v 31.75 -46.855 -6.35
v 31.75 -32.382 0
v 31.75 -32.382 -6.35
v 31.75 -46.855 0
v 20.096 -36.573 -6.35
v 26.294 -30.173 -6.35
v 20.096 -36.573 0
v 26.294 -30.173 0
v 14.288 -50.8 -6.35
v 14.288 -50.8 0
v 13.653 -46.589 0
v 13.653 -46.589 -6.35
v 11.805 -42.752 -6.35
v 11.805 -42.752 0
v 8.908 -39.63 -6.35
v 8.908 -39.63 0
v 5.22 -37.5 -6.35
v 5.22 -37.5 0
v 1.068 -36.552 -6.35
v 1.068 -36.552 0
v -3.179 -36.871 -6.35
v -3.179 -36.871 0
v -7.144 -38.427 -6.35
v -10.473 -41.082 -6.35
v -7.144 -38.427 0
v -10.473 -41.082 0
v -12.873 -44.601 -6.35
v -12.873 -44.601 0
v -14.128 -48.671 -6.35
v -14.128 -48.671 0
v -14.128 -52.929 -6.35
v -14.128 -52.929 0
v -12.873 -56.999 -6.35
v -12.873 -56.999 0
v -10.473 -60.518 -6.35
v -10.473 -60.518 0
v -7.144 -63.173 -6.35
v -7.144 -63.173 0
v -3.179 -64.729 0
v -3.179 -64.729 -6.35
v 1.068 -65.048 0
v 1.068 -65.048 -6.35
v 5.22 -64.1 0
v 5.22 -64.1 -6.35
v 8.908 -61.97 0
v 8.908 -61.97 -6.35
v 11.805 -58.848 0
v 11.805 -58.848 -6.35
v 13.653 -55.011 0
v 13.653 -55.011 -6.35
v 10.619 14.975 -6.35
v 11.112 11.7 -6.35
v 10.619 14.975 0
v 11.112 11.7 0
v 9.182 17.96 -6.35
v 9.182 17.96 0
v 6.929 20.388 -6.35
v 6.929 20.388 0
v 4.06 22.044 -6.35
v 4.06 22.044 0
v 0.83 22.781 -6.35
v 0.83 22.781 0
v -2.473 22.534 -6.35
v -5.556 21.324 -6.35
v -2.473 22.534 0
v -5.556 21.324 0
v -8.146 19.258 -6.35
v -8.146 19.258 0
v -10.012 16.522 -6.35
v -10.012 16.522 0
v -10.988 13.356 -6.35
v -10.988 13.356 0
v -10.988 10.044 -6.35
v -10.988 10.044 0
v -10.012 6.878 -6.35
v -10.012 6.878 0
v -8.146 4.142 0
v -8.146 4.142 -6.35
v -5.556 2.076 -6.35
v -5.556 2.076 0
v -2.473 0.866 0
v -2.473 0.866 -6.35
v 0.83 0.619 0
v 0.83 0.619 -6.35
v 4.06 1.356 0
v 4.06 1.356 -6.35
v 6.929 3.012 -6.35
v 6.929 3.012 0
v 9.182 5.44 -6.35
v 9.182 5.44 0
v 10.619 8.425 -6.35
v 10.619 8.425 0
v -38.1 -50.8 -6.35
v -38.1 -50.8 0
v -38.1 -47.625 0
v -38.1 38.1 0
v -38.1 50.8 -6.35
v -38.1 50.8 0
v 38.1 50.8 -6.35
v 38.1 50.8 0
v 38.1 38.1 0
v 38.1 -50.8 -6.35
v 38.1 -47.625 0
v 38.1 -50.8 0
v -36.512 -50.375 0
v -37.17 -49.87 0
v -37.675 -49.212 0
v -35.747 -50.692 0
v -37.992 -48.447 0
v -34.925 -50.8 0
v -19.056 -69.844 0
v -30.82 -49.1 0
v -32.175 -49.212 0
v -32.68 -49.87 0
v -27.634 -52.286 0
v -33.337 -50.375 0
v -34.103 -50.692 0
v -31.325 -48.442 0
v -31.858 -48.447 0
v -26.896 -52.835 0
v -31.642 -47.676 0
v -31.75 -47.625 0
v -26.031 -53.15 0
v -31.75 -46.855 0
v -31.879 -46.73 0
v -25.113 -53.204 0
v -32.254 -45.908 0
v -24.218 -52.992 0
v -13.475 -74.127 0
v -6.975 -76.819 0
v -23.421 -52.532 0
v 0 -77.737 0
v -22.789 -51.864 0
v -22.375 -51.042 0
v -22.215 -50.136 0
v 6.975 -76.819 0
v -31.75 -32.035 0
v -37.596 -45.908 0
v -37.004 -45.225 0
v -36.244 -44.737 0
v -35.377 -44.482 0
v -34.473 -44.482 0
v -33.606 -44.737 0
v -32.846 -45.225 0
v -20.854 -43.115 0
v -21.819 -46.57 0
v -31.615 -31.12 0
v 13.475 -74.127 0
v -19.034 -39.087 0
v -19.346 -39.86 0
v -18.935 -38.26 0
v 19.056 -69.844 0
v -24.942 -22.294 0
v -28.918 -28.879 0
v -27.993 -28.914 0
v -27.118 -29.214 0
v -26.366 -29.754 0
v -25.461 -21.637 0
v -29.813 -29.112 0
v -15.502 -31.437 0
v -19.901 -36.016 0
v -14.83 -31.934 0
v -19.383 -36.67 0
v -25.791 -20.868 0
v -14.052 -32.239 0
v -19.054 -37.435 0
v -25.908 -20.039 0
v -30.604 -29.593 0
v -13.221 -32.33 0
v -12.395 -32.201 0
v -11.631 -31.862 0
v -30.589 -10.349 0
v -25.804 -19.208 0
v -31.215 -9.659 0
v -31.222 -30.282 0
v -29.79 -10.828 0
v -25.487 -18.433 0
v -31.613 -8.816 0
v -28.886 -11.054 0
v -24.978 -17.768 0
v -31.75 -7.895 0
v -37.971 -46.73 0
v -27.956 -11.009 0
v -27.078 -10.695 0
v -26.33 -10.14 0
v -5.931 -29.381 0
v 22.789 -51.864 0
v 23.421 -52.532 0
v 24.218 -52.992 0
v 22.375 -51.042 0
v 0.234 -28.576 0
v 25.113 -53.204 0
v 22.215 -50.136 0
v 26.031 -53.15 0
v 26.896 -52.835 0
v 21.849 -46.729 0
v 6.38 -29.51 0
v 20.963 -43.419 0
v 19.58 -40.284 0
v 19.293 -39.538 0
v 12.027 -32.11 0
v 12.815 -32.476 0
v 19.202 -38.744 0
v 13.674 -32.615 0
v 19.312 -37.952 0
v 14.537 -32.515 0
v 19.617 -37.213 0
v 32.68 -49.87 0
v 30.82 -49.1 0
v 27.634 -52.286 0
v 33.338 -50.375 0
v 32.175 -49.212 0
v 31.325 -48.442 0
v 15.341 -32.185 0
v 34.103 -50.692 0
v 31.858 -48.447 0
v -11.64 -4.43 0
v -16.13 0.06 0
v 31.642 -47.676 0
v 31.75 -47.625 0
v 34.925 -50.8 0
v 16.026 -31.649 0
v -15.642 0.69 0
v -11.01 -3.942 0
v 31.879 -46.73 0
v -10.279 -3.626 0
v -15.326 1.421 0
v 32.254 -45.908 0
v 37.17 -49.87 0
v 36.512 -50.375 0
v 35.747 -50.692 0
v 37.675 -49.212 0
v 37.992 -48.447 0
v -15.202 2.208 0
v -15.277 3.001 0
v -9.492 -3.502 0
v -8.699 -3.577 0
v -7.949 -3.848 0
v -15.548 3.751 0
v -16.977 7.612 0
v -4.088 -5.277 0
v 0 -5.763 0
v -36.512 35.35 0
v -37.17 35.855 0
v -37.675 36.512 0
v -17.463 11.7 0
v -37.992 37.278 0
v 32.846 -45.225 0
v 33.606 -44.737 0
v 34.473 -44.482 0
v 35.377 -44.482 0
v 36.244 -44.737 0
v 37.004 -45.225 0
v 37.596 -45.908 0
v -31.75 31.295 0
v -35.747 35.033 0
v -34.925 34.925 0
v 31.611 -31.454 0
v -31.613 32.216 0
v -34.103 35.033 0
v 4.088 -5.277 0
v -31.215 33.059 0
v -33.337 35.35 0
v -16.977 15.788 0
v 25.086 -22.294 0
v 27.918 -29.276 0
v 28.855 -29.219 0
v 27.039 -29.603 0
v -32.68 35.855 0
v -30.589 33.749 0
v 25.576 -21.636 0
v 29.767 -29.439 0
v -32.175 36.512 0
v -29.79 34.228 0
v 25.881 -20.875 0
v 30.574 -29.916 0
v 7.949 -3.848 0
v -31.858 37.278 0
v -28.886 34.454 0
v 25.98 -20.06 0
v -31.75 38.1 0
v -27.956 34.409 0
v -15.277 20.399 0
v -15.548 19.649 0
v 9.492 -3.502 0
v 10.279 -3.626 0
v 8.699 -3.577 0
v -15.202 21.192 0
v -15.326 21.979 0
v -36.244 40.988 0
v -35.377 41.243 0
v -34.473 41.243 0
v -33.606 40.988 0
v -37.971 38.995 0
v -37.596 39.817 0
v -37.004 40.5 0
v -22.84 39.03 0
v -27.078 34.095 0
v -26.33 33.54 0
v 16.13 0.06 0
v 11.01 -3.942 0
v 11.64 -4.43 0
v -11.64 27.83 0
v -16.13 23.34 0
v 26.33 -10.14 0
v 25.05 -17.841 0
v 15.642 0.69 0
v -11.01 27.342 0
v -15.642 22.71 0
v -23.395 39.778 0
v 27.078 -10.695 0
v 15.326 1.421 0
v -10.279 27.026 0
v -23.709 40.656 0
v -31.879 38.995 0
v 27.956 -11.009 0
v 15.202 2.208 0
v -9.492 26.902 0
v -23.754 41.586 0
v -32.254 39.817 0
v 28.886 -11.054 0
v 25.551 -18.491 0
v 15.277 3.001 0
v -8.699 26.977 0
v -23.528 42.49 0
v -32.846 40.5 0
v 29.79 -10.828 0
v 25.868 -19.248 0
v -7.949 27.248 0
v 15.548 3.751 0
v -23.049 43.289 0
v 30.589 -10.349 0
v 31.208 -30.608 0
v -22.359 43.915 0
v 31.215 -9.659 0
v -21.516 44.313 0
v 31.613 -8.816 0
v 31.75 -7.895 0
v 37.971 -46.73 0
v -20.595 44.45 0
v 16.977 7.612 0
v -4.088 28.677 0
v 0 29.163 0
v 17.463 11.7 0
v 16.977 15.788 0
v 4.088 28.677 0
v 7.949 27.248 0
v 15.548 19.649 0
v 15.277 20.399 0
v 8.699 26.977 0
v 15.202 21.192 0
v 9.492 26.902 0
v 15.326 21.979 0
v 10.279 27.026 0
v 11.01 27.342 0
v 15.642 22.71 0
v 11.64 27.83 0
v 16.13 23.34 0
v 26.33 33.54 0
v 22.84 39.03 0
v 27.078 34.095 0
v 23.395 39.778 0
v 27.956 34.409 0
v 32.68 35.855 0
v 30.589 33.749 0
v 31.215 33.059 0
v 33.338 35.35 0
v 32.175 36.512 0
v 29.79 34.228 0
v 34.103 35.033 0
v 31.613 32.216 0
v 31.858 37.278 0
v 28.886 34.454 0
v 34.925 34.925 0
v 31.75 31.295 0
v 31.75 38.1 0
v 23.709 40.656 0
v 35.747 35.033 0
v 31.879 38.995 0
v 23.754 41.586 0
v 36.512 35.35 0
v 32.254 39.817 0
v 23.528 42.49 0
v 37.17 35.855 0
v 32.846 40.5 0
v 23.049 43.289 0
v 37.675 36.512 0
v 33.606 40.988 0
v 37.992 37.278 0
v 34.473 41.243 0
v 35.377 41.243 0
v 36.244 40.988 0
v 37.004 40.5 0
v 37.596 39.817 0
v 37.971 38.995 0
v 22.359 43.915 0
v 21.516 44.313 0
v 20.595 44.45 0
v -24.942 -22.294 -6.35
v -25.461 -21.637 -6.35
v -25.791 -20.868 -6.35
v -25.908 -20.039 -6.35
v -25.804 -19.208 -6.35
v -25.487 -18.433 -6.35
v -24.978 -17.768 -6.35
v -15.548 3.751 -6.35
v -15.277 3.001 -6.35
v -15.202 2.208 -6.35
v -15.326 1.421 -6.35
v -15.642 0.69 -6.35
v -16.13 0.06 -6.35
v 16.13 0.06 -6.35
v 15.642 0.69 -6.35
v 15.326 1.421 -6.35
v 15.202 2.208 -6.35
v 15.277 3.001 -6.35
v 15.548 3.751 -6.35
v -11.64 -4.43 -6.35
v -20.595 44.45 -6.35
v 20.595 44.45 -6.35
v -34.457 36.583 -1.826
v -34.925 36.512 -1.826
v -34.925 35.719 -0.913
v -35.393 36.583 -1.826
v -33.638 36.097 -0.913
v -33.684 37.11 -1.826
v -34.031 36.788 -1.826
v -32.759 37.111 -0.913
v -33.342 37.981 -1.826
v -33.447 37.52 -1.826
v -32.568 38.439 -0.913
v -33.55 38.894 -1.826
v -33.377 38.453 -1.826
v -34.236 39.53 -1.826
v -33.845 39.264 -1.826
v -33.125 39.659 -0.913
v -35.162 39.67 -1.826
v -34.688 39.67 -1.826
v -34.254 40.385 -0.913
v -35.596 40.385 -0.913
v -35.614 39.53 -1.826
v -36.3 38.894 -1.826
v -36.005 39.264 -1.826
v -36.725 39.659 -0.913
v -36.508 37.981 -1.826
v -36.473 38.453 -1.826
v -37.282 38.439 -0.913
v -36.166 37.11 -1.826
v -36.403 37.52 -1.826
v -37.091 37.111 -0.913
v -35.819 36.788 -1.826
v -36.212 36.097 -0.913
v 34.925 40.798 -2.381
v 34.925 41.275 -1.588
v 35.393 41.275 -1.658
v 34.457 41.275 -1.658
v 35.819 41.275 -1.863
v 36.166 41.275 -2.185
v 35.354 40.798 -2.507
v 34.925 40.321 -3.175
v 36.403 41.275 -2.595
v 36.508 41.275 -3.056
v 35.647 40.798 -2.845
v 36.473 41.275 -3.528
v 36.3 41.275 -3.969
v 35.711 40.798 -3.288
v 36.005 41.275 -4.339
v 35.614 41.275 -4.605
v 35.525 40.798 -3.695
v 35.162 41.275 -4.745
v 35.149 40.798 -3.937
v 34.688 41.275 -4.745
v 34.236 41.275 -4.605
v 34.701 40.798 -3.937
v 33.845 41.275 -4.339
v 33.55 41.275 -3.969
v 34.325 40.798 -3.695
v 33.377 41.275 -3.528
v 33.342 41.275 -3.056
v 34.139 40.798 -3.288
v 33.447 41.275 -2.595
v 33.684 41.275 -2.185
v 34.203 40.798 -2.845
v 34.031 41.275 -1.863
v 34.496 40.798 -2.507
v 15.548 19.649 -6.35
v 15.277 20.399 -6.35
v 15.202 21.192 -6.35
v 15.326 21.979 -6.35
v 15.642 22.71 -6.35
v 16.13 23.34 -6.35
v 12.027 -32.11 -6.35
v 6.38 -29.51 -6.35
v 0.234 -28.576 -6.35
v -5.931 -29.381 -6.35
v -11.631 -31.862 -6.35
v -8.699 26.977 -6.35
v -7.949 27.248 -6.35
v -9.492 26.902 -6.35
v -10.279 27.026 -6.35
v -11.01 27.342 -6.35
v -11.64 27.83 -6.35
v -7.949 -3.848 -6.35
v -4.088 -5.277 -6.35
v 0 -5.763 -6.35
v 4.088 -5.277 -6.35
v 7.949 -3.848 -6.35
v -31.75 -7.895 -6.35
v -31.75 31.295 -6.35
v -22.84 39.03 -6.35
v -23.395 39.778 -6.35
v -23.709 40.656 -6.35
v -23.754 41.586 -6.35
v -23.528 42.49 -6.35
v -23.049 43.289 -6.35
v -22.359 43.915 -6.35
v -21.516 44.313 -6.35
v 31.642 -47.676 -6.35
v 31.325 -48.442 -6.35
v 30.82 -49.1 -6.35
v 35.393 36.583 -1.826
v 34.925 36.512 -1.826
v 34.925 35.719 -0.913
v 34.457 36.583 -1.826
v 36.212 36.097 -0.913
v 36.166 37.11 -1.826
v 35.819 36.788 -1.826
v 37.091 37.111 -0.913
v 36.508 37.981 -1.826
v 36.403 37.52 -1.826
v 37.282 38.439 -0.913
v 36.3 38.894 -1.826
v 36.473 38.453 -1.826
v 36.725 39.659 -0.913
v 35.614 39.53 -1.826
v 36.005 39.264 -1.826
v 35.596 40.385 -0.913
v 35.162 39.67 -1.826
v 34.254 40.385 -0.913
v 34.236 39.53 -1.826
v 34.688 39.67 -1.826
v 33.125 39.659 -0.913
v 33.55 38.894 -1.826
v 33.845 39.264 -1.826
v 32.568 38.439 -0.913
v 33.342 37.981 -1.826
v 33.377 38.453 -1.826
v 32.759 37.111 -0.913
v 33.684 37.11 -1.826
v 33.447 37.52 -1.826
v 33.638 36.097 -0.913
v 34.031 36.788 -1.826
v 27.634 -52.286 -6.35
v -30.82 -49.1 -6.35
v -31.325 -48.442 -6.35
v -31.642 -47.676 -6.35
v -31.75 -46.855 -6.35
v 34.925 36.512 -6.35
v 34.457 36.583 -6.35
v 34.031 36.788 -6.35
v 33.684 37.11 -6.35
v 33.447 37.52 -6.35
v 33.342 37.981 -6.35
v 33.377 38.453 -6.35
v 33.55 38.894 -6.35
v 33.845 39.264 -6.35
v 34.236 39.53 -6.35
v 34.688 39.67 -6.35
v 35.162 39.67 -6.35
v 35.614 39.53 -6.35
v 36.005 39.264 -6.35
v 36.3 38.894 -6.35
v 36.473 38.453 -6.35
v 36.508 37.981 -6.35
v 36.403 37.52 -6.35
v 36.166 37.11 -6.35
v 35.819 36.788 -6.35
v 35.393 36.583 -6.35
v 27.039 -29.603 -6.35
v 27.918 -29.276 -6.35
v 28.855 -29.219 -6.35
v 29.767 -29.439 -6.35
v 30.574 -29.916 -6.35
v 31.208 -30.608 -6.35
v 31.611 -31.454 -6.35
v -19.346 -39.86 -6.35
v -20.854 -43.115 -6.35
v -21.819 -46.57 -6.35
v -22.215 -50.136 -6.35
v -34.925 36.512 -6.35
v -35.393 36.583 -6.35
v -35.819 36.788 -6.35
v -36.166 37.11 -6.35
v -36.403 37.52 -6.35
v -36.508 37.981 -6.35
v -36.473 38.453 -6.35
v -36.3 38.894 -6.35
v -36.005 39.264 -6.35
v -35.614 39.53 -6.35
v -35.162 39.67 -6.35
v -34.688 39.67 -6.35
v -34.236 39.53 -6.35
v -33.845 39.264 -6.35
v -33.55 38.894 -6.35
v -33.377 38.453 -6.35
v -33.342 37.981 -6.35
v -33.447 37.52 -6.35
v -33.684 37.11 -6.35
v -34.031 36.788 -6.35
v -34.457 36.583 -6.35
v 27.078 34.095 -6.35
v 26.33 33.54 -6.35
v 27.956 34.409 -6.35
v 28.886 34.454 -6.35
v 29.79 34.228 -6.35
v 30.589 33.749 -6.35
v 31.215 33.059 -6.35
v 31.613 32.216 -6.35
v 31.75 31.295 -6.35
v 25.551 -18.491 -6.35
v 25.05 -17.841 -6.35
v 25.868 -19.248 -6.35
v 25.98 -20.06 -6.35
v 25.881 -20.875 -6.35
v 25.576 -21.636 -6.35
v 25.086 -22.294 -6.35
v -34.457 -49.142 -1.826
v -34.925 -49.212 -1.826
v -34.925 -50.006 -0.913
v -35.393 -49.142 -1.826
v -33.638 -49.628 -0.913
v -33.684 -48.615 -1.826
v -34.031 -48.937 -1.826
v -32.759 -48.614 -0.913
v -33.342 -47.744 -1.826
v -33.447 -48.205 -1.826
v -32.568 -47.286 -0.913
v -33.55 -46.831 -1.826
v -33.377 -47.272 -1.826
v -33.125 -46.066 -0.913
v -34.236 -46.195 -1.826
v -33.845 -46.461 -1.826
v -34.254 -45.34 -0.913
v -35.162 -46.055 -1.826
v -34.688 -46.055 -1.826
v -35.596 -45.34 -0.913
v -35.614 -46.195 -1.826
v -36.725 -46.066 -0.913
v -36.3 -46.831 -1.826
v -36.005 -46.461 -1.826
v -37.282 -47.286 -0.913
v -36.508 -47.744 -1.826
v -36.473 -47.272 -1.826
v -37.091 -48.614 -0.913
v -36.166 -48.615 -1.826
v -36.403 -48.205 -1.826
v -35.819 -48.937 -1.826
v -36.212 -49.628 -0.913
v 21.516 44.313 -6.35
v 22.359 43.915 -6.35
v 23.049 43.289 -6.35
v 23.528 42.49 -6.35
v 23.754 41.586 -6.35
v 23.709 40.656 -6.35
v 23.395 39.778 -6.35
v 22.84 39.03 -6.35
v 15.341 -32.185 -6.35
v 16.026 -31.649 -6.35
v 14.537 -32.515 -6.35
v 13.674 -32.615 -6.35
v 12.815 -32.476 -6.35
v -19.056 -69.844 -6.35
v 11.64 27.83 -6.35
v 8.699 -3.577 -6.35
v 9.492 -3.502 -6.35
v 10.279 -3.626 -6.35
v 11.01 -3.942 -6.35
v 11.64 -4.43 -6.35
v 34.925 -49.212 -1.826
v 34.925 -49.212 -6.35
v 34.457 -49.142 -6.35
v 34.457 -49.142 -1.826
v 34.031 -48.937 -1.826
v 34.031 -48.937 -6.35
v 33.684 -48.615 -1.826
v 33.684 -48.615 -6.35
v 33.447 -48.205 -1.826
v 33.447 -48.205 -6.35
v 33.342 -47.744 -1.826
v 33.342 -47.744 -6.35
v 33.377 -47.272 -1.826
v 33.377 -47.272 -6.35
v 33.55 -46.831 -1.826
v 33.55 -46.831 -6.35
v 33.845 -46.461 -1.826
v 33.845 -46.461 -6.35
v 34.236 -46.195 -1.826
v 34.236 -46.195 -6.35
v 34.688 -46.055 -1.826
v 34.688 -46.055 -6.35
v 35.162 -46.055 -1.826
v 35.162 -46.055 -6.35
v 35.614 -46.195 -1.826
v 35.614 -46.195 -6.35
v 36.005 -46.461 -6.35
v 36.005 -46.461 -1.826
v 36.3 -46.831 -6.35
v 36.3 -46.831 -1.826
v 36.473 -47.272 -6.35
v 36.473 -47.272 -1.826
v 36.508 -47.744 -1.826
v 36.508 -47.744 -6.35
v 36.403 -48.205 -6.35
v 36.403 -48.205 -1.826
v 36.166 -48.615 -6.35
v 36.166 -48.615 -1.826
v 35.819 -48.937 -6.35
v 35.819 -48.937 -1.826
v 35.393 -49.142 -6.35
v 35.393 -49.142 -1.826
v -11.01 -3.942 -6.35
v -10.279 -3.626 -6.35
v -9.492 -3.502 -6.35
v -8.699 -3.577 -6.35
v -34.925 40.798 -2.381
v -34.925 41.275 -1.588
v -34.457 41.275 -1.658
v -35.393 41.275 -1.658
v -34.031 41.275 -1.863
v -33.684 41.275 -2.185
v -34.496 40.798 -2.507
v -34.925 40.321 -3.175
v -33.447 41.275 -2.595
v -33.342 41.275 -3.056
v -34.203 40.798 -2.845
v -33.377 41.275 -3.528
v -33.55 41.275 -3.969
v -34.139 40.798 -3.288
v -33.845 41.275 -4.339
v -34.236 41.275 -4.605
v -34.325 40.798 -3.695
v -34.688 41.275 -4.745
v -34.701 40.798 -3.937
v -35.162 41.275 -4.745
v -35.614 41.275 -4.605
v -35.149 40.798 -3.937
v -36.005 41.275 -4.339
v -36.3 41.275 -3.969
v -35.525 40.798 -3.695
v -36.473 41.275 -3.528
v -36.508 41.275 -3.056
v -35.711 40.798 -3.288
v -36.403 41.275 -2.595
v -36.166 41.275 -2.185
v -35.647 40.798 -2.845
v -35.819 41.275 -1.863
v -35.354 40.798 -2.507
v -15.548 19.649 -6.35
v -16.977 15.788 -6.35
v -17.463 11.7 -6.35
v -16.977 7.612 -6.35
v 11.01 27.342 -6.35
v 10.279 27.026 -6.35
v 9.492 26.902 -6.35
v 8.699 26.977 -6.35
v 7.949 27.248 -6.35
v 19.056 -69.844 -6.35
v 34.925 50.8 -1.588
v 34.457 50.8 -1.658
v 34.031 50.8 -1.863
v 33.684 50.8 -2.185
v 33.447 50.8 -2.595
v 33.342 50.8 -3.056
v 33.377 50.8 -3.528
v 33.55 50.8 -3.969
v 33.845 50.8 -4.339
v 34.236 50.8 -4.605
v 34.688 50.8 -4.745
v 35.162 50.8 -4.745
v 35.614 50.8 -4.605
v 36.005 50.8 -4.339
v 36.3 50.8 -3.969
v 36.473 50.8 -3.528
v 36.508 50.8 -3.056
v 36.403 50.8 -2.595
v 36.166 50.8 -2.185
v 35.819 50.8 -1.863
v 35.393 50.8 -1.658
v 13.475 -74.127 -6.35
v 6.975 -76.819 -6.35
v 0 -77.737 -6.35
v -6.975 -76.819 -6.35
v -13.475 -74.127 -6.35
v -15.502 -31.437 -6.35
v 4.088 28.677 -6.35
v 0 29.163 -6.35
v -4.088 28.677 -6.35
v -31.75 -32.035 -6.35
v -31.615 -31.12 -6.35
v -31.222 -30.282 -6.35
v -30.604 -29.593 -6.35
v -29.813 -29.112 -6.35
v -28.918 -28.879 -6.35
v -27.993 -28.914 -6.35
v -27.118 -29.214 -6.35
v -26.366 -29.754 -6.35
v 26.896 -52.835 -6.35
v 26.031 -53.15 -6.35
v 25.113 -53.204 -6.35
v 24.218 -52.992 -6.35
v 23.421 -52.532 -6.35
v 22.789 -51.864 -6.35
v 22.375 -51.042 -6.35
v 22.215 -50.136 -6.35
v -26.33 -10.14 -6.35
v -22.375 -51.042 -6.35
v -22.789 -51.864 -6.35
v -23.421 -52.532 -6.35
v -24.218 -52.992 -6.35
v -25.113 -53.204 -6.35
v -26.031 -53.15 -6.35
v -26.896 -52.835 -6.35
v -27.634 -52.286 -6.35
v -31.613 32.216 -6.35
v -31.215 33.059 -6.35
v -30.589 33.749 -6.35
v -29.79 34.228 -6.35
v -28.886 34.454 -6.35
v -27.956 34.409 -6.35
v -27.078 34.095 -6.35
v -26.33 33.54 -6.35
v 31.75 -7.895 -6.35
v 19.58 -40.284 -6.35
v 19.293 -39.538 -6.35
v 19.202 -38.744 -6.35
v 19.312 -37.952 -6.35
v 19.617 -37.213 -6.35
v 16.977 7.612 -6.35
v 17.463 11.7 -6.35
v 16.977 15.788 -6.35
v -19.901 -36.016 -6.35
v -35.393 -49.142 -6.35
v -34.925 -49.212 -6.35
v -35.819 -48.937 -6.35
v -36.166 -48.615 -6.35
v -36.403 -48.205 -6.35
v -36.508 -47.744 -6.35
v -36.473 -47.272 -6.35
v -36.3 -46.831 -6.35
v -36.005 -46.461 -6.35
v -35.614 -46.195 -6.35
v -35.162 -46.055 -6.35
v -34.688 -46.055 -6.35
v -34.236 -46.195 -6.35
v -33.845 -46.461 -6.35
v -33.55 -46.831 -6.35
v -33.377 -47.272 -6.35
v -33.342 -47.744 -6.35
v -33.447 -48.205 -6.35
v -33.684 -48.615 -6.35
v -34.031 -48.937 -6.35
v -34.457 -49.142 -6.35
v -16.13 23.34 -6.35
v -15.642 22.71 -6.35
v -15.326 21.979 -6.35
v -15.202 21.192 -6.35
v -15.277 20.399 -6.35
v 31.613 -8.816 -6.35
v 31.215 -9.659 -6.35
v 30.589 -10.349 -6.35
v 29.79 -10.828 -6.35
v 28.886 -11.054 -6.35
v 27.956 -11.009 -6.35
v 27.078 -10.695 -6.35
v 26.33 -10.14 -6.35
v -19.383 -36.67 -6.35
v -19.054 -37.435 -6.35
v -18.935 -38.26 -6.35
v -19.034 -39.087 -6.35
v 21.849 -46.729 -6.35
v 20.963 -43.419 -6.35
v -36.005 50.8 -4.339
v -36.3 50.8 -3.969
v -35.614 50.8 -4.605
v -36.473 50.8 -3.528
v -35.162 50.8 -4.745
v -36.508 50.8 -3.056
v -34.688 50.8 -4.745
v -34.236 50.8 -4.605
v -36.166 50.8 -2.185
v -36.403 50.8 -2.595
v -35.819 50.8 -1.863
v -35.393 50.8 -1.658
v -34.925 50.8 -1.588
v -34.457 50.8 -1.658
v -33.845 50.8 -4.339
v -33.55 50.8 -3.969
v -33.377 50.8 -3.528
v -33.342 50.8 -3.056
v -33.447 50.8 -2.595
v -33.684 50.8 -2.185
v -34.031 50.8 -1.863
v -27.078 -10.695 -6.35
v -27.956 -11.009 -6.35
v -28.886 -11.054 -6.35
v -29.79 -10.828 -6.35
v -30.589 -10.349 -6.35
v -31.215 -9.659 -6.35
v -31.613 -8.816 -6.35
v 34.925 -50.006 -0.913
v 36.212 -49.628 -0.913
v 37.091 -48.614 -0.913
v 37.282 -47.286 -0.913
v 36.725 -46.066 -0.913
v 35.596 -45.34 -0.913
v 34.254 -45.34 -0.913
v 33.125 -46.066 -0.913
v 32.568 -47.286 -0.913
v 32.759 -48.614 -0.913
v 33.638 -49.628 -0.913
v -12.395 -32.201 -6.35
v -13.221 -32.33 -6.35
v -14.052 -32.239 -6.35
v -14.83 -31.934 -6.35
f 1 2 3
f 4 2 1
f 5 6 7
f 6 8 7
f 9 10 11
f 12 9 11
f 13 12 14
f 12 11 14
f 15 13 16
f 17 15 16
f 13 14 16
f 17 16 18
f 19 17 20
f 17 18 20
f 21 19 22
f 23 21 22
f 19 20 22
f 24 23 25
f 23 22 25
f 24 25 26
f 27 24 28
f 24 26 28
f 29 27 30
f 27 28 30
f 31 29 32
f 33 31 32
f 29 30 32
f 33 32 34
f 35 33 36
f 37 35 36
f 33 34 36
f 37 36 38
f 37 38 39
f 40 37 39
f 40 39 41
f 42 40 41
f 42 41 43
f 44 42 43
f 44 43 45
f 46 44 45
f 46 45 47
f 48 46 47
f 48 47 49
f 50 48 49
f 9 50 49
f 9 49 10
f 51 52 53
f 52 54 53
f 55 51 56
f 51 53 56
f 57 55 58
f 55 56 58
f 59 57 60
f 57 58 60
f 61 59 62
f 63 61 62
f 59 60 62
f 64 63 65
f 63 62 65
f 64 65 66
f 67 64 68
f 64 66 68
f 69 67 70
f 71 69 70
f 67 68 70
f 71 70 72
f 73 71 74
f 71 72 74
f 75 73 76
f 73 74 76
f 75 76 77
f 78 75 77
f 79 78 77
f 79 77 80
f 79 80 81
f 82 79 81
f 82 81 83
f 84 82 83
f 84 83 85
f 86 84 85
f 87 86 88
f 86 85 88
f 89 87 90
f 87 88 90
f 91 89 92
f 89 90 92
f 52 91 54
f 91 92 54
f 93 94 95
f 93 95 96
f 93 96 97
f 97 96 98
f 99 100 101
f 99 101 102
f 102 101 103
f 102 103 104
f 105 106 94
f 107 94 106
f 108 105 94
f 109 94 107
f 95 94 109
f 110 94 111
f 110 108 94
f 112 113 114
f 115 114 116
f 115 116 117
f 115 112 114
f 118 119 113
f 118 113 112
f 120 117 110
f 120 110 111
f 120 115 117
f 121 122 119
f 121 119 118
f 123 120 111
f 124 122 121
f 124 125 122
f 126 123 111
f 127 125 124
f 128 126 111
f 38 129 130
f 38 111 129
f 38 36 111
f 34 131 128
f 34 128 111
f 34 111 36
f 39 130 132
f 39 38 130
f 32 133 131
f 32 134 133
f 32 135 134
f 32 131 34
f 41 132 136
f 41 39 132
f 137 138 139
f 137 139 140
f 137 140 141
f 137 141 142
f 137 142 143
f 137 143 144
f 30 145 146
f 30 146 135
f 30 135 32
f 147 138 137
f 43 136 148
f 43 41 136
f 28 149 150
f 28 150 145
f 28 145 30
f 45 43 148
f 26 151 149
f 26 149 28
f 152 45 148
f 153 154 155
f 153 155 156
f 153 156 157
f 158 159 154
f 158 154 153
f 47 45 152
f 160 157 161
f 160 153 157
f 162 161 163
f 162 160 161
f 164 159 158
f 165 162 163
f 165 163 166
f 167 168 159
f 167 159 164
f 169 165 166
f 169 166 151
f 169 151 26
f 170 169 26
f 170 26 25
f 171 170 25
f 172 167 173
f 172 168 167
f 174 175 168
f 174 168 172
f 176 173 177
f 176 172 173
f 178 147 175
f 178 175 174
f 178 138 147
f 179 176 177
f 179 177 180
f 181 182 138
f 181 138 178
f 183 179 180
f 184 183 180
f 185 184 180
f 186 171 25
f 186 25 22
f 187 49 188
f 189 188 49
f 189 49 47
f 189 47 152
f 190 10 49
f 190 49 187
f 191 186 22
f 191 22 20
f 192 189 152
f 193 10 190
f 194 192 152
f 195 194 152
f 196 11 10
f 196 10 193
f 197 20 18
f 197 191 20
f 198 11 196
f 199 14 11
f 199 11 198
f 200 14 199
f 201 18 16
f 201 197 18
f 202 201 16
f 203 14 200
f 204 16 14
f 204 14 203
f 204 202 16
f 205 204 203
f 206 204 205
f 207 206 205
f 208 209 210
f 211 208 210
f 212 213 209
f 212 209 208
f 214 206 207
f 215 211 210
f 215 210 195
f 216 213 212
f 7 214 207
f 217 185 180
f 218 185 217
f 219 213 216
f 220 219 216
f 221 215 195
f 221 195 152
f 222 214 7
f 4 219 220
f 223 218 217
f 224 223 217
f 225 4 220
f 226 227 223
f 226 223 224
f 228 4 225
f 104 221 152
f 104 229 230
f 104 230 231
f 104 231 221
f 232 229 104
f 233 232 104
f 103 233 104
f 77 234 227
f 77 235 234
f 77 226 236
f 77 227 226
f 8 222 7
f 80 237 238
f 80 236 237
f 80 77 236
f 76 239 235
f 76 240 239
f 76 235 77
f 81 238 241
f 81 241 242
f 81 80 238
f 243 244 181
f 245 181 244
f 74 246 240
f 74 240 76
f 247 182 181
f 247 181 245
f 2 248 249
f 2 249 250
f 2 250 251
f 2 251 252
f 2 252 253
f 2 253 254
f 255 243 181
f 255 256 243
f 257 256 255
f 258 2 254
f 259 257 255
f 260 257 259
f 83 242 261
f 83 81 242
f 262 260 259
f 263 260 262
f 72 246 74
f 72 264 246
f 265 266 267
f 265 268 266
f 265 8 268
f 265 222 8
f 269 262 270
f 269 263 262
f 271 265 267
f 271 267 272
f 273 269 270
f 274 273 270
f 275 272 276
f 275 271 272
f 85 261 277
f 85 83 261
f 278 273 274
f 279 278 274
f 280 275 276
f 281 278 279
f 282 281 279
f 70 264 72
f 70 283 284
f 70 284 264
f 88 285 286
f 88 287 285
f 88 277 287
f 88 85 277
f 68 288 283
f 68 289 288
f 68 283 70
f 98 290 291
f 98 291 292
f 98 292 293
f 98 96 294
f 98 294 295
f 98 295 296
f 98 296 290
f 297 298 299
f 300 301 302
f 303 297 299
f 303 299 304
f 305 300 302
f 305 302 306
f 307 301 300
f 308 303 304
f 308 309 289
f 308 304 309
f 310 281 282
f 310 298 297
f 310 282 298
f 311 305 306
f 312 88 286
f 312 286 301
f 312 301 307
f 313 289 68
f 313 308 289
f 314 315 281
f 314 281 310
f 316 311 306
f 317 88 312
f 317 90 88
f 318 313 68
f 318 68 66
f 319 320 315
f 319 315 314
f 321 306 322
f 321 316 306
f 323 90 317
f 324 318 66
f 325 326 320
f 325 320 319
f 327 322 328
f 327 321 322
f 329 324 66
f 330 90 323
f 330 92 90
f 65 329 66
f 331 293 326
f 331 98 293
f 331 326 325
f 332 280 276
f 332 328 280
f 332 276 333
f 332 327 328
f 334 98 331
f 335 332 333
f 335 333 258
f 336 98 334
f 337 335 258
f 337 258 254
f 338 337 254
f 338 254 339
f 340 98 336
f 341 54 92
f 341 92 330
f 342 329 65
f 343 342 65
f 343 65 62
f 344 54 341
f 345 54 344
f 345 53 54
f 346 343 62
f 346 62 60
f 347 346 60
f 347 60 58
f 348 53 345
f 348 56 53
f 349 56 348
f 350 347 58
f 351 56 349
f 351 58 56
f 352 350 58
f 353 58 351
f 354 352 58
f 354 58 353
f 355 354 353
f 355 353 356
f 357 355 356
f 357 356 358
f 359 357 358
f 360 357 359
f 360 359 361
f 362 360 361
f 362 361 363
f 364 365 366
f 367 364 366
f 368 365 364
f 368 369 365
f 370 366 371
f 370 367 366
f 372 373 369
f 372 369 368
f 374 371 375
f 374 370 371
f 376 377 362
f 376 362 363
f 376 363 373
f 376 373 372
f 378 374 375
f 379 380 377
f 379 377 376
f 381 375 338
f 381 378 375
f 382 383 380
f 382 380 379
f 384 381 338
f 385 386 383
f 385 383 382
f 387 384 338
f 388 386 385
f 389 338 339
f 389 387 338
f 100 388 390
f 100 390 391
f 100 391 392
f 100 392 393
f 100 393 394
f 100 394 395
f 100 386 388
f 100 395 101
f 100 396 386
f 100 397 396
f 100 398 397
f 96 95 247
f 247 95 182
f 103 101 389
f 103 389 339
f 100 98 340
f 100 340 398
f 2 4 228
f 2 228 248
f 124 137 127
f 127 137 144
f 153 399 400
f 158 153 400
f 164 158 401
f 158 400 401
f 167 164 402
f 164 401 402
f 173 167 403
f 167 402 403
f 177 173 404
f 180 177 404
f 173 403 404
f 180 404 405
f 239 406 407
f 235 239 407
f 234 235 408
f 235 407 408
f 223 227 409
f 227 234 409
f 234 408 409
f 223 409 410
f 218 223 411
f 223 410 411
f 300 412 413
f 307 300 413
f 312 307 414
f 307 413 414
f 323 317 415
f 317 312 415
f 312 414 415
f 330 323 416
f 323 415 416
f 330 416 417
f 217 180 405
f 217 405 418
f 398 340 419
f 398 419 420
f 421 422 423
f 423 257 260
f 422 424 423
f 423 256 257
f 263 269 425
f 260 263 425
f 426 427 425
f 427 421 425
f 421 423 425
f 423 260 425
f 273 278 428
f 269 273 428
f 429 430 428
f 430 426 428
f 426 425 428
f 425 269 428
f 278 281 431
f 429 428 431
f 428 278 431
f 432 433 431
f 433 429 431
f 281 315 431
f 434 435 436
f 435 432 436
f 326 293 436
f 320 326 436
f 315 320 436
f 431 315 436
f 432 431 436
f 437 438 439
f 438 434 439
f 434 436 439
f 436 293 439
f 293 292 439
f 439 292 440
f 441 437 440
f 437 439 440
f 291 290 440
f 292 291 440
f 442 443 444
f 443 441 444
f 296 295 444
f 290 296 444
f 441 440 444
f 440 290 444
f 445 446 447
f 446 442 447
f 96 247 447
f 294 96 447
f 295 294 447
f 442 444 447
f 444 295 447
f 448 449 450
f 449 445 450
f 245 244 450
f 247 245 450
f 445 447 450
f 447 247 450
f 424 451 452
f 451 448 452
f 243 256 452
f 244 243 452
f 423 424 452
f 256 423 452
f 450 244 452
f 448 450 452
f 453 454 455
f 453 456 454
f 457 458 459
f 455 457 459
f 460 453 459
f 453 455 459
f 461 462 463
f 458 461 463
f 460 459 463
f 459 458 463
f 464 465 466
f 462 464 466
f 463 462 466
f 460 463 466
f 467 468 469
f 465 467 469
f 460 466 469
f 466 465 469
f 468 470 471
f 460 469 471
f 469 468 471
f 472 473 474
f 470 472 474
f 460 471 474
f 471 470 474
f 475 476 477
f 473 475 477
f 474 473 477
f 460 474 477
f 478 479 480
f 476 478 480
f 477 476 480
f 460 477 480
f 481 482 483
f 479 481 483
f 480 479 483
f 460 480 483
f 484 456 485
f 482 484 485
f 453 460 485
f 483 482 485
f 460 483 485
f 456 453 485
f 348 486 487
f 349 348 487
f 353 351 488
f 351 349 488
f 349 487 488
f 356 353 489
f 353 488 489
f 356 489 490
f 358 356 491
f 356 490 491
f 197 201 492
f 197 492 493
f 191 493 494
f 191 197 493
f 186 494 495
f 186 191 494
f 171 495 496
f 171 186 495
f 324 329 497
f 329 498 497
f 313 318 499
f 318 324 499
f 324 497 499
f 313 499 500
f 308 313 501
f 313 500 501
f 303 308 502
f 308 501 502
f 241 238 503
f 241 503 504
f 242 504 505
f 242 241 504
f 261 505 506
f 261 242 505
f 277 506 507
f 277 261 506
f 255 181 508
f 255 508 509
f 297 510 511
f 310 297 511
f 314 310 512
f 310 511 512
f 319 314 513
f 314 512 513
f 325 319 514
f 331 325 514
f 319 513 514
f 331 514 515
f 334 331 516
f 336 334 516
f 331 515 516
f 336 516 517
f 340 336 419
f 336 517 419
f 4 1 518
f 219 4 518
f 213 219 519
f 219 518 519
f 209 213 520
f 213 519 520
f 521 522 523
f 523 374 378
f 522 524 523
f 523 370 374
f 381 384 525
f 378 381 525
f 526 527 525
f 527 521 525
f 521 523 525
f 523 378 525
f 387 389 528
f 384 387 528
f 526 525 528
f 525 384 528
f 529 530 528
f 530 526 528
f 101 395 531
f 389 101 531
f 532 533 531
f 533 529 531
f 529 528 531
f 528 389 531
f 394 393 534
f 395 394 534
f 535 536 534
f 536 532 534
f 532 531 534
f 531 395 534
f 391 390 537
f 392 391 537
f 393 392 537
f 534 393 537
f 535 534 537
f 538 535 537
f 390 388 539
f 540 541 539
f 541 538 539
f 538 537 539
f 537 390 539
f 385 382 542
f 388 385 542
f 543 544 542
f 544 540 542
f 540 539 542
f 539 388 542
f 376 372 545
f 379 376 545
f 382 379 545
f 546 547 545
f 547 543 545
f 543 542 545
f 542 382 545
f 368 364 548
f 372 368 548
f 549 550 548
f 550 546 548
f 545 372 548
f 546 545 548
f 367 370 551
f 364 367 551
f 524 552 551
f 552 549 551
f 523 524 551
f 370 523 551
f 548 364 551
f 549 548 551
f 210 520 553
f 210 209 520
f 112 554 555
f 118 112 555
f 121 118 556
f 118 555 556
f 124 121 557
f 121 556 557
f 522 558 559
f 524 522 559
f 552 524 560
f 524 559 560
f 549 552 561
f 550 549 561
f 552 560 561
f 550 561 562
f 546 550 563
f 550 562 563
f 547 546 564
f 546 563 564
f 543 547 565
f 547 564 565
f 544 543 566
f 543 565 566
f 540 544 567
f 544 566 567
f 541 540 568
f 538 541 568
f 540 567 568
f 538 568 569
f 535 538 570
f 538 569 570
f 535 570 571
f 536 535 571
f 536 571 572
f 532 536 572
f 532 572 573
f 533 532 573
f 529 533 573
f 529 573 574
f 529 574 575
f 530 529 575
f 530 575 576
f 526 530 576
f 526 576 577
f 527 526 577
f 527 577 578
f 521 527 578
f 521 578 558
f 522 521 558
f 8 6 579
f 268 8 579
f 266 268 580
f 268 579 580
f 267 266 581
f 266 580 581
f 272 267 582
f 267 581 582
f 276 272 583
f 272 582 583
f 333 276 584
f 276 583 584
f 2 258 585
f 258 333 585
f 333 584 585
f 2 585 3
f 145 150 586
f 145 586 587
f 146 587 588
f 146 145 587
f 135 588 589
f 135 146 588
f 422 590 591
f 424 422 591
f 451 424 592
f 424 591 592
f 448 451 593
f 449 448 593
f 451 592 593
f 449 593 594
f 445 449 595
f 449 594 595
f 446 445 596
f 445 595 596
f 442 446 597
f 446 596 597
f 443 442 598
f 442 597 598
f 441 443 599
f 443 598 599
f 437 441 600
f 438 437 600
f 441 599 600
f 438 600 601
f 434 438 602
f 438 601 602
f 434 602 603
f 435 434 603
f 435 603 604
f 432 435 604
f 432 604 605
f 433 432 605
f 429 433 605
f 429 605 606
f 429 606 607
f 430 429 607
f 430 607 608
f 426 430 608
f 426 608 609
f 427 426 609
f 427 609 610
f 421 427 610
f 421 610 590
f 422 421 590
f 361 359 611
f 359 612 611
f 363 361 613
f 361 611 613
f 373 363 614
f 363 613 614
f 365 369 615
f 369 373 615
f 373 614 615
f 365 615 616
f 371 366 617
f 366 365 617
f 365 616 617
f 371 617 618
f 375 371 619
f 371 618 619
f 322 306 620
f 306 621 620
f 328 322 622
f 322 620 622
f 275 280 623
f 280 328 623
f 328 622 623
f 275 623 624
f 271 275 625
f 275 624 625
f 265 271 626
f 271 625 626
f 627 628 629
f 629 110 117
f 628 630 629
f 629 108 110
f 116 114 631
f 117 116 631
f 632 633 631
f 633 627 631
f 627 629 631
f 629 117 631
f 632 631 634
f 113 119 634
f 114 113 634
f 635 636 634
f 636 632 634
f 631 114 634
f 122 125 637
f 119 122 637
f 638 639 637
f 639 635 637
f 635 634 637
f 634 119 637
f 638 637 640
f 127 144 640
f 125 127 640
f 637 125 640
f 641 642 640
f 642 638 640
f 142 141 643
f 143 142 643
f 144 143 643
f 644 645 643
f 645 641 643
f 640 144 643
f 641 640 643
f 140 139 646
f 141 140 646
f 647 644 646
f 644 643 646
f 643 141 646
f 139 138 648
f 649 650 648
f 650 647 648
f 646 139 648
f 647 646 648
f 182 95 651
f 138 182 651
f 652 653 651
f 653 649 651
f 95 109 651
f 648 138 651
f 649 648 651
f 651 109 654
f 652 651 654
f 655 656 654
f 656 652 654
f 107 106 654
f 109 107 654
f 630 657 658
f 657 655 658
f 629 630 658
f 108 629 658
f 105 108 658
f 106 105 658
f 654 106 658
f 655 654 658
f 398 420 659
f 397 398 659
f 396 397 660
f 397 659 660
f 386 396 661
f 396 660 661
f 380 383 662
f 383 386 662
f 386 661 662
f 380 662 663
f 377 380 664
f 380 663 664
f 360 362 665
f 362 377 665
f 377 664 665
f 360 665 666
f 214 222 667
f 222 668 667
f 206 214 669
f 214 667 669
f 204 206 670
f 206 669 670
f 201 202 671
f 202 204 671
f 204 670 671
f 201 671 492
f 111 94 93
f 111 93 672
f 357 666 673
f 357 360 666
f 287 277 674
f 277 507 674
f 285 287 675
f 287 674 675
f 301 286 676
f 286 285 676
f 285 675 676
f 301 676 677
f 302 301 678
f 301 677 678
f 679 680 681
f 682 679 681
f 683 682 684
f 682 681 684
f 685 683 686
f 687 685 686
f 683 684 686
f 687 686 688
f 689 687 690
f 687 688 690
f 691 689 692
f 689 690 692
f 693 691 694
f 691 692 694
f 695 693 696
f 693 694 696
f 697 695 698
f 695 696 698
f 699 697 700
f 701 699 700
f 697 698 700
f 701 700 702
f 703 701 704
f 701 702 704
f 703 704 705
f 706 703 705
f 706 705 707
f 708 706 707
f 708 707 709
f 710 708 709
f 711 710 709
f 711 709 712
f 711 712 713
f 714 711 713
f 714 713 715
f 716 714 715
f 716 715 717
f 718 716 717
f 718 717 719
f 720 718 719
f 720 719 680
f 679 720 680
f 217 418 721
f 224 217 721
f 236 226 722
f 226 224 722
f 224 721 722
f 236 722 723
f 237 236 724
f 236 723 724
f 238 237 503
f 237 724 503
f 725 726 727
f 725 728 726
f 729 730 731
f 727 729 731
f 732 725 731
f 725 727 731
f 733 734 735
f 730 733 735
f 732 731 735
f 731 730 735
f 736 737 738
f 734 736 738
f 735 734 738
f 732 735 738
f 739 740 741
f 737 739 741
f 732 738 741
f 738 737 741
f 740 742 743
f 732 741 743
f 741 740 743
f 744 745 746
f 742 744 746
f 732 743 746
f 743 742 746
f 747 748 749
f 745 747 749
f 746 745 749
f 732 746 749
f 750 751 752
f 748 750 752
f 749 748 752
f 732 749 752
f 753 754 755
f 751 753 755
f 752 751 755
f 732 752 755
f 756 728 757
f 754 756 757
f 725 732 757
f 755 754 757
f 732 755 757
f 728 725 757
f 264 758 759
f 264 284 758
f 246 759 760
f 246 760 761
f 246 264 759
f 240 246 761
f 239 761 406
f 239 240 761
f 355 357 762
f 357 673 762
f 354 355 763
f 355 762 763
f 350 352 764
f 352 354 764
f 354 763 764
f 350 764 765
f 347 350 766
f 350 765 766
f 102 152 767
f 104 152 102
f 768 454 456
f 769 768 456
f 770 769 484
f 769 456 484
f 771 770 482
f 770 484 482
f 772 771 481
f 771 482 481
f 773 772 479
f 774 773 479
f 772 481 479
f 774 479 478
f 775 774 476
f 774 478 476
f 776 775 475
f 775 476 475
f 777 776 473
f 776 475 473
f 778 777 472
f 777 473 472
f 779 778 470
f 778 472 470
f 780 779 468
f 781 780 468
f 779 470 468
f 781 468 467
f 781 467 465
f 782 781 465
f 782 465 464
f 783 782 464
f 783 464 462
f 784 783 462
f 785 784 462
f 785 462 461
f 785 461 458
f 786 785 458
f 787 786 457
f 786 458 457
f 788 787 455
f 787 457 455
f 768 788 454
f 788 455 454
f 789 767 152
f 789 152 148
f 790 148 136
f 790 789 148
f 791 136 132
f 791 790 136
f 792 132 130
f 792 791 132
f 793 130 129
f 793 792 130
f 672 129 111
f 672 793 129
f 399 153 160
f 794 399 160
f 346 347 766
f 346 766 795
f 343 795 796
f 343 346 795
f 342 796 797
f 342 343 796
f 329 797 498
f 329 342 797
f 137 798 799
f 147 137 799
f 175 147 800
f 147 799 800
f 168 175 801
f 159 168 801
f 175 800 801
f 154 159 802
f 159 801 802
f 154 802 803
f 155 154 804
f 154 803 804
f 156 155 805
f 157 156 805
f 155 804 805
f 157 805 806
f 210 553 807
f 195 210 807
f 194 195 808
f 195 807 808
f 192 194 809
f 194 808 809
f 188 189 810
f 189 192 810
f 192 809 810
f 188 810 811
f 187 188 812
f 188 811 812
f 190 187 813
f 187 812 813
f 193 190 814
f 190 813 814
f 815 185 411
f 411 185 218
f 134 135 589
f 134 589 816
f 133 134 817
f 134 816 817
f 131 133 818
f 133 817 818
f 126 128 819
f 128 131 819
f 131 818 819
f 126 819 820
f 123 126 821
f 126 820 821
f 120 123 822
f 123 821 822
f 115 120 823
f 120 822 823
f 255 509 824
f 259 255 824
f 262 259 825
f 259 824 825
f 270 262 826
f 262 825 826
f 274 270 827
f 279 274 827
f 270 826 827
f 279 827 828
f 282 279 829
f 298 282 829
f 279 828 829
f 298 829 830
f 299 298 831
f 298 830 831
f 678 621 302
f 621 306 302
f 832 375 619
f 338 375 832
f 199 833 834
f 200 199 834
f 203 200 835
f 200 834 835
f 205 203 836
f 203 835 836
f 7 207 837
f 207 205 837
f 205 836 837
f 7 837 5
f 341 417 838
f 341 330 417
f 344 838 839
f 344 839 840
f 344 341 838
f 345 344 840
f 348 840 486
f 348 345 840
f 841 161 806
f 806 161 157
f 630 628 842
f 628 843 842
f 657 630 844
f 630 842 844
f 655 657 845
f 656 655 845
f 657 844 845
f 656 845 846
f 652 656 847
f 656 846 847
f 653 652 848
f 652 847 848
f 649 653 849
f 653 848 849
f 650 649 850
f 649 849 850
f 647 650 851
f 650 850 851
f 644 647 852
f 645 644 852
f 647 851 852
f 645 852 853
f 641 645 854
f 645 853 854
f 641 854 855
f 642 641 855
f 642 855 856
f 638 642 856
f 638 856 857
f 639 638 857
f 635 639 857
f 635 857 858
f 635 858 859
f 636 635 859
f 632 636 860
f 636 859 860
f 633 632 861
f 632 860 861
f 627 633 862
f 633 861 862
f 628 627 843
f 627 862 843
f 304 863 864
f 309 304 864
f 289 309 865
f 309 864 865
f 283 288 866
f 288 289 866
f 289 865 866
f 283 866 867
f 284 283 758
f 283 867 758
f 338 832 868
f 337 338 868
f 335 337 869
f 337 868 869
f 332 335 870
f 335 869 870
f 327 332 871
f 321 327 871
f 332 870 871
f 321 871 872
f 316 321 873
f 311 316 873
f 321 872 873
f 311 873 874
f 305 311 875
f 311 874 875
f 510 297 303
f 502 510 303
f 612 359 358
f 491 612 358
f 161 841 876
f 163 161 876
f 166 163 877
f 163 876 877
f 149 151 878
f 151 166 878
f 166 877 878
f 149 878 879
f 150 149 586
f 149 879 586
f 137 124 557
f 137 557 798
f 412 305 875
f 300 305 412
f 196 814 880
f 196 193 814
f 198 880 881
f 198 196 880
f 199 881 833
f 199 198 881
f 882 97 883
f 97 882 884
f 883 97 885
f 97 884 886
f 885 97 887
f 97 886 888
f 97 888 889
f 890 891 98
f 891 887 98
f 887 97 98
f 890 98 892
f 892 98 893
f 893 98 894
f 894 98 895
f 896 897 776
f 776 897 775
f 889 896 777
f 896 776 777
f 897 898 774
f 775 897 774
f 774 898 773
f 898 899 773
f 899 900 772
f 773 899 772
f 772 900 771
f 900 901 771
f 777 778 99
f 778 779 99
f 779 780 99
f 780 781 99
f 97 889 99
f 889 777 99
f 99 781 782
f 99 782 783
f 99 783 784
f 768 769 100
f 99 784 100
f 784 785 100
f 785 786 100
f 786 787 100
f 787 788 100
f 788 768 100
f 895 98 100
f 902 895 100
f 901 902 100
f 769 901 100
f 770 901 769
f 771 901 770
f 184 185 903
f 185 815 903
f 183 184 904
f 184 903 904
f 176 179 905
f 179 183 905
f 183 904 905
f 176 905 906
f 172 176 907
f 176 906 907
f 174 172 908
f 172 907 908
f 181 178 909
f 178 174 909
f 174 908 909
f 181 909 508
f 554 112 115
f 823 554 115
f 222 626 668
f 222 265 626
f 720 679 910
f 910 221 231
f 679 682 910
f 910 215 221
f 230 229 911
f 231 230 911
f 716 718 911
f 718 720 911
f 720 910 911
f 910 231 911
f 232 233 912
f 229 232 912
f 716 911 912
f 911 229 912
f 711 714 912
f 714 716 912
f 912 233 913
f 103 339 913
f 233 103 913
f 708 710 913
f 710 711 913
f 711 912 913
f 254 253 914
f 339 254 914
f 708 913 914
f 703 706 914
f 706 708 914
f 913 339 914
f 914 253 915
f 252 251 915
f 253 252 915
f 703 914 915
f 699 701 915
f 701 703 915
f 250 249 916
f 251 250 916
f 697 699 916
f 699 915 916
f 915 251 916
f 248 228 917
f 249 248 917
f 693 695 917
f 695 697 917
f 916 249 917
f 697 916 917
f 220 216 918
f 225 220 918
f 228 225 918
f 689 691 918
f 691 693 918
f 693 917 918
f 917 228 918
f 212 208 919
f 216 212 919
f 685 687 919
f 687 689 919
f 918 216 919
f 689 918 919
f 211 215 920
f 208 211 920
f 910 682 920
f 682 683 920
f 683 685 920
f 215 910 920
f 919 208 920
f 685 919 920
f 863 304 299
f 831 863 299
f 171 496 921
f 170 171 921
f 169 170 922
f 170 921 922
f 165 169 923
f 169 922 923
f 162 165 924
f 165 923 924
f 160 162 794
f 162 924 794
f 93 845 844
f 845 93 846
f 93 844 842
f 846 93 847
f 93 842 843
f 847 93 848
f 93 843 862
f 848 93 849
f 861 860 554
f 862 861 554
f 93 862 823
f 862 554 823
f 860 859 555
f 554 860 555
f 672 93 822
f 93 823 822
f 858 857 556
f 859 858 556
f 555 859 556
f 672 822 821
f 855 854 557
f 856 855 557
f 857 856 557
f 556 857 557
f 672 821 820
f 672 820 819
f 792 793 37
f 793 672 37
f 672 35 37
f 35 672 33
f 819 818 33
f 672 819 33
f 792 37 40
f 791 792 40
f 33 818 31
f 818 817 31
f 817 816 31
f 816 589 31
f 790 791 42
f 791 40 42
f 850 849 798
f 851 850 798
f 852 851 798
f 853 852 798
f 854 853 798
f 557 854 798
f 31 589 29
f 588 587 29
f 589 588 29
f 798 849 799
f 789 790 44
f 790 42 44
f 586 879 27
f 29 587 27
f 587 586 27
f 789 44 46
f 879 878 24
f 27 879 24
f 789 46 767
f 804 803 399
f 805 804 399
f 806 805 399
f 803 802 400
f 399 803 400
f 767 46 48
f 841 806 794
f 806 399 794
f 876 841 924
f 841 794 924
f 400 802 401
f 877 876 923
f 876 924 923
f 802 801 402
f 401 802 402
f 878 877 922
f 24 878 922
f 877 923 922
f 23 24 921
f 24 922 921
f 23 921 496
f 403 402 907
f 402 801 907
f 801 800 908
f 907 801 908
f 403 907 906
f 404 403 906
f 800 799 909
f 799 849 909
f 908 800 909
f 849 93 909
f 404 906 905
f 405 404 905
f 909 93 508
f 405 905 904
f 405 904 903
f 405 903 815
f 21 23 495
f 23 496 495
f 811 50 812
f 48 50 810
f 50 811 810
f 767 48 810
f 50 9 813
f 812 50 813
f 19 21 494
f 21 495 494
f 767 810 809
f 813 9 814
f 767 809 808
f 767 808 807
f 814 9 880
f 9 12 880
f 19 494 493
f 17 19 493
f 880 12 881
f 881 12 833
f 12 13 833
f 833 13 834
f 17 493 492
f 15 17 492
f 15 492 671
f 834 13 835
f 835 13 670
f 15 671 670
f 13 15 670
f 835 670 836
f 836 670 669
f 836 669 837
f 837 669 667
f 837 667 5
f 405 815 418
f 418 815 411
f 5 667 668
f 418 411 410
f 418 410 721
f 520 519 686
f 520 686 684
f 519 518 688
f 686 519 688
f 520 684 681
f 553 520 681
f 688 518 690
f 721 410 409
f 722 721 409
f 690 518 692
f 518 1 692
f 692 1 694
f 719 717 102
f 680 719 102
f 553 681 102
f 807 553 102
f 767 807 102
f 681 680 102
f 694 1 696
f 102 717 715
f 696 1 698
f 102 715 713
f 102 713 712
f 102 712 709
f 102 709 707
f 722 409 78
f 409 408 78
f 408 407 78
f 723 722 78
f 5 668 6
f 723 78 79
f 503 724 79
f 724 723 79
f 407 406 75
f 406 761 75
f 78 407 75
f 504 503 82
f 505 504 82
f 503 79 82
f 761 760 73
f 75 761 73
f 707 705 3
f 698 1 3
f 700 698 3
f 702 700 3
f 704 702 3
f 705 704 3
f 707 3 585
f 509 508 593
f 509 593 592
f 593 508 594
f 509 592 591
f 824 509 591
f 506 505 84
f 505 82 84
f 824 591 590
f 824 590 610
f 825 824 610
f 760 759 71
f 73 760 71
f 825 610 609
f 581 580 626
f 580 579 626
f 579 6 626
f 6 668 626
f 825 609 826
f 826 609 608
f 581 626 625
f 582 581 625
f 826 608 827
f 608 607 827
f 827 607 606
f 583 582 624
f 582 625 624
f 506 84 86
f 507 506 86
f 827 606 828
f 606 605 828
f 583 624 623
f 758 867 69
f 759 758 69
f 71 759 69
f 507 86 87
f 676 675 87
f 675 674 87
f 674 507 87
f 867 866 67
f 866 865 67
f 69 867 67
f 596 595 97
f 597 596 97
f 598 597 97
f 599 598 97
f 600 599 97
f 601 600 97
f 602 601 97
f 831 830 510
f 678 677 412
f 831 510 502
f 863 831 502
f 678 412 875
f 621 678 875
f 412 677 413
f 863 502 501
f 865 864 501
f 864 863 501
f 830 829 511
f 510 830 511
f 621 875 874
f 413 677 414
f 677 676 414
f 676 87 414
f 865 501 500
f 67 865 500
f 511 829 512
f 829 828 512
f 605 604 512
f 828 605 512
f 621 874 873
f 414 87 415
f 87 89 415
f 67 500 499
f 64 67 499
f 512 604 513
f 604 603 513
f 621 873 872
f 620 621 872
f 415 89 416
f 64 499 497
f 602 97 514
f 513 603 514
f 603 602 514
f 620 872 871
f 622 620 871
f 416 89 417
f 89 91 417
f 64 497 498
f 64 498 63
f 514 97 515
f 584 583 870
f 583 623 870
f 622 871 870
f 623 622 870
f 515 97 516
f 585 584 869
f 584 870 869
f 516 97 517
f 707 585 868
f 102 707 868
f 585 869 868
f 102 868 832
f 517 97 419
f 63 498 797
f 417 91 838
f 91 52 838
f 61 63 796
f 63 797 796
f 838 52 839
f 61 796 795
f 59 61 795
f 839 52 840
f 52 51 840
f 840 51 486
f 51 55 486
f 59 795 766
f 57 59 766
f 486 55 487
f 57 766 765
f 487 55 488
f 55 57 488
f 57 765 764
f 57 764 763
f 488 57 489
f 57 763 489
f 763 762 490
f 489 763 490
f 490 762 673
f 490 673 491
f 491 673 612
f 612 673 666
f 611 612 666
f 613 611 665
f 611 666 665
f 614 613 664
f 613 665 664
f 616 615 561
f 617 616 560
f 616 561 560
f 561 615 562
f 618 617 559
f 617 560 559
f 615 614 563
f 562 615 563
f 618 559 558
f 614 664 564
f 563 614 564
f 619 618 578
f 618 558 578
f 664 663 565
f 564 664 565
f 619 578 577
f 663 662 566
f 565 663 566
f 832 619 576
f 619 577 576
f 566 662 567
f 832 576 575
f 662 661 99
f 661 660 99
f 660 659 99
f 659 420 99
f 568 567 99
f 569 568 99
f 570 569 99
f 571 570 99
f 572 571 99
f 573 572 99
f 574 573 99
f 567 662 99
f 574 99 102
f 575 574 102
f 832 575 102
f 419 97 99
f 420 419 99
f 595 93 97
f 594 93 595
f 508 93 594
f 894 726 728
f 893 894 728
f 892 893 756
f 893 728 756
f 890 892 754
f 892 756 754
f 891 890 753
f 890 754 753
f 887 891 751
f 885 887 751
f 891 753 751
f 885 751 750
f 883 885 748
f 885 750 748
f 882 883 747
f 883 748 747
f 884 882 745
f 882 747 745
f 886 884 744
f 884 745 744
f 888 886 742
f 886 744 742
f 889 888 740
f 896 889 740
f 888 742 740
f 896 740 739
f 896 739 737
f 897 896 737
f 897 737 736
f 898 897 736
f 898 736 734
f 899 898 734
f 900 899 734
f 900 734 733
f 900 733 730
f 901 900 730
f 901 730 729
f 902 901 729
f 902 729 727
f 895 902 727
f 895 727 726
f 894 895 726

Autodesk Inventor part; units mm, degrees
ref_plane "YZ Plane" through (0, 0, 0) normal (1, 0, 0) x (0, 1, 0)
ref_plane "XZ Plane" through (0, 0, 0) normal (0, 1, 0) x (-1, 0, 0)
ref_plane "XY Plane" through (0, 0, 0) normal (0, 0, 1) x (1, 0, 0)
sketch "Sketch1" plane through (0, 0, 0) normal (0, 0, 1) x (1, 0, 0)
  line L0 (-38.1, 50.8) -> (38.1, 50.8)
  line L1 (38.1, 50.8) -> (38.1, -50.8)
  line L2 (-38.1, -50.8) -> (-38.1, 50.8)
  circle A0 centre (0, 11.7) radius 11.1125
  line L3 (-38.1, -50.8) -> (0, -88.9)
  line L4 (0, -88.9) -> (38.1, -50.8)
  circle A1 centre (0, -50.8) radius 14.2875
  point P0 (0, 0)
  point P1 (-34.925, -47.625)
  point P2 (34.925, -47.625)
  point P3 (-34.925, 38.1)
  point P4 (34.925, 38.1)
  dimension "d0" = 76.2
  dimension "d1" = 38.1
  dimension "d2" = 101.6
  dimension "d3" = 50.8
  dimension "d4" = 101.6
  dimension "d5" = 38.1
  dimension "d6" = 38.1
  dimension "d7" = 28.575
  dimension "d8" = 38.1
  dimension "d9" = 38.1
  dimension "d10" = 22.225
  dimension "d11" = 38.1
  dimension "d13" = 3.175
  dimension "d14" = 12.7
  dimension "d15" = 3.175
  dimension "d16" = 3.175
  dimension "d17" = 3.175
  dimension "d18" = 3.175
  dimension "d31" = 3.175
  dimension "d32" = 12.7
  dimension "d88" = 62.5
extrude "Extrusion1" add sketch "Sketch1" against normal blind 6.35
fillet "Fillet1" radius 26.9494 1 edges at (0, -88.9, -3.175)
sketch "Sketch2" plane through (0, 0, 0) normal (0, 0, 1) x (1, 0, 0)
  line L0 (-38.1, 50.8) -> (38.1, 50.8) projected
  line L1 (-38.1, -50.8) -> (-38.1, 50.8) projected
  line L2 (38.1, -50.8) -> (19.0561, -69.8439) projected
  line L3 (38.1, 50.8) -> (38.1, -50.8) projected
  line L4 (-19.0561, -69.8439) -> (-38.1, -50.8) projected
  circle A0 centre (0, -50.8) radius 14.2875 projected
  line L5 (-31.75, 44.45) -> (31.75, 44.45)
  line L6 (31.75, 44.45) -> (31.75, -48.1697)
  line L7 (-31.75, -48.1697) -> (-31.75, 44.45)
  line L8 (-31.75, -48.1697) -> (-20.4747, -59.445)
  line L9 (31.75, -48.1697) -> (20.4747, -59.445)
  arc A1 (20.4747, -59.445) -> (-20.4747, -59.445) centre (0, -50.8) ccw
  arc A2 (9.897, 26.0871) -> (-9.897, 26.0871) centre (0, 11.7) ccw
  arc A3 (14.3871, 1.803) -> (14.3871, 21.597) centre (0, 11.7) ccw
  arc A4 (-9.897, -2.6871) -> (9.897, -2.6871) centre (0, 11.7) ccw
  arc A5 (-14.3871, 21.597) -> (-14.3871, 1.803) centre (0, 11.7) ccw
  line L10 (0, 11.7) -> (-31.75, 43.45) construction
  line L11 (-31.75, 43.45) -> (0, 11.7) construction
  line L12 (0, 11.7) -> (31.75, 43.45) construction
  line L13 (0, 11.7) -> (-31.75, -20.05) construction
  line L14 (0, 11.7) -> (31.75, -20.05) construction
  line L15 (-31.75, 38.9599) -> (-14.3871, 21.597) construction
  line L16 (-14.3871, 21.597) -> (-31.75, 38.9599)
  line L17 (-28.2599, 44.45) -> (-9.897, 26.0871)
  line L18 (28.2599, 44.45) -> (9.897, 26.0871)
  line L19 (31.75, 38.9599) -> (14.3871, 21.597)
  line L20 (31.75, -15.5599) -> (14.3871, 1.803)
  line L21 (14.3871, 1.803) -> (31.75, -15.5599)
  line L22 (31.75, -24.5401) -> (9.897, -2.6871)
  line L23 (-31.75, -24.5401) -> (-9.897, -2.6871)
  line L24 (-31.75, -15.5599) -> (-14.3871, 1.803)
  line L25 (-31.75, -20.05) -> (0, -50.8) construction
  line L26 (0, -50.8) -> (31.75, -20.05) construction
  line L27 (-18.0398, -37.8186) -> (-31.75, -24.5401)
  line L28 (31.75, -24.5401) -> (18.396, -38.3285)
  line L29 (27.2599, -20.05) -> (14.1094, -33.6281)
  line L30 (-27.2593, -20.0494) -> (-13.6325, -33.247)
  point P0 (38.1, -47.625)
  point P1 (38.1, 41.275)
  point P2 (25.4, 50.8)
  point P3 (-25.4, 50.8)
  point P4 (-38.1, 41.275)
  point P5 (-38.1, -47.625)
  point P6 (-34.925, 38.1)
  point P7 (-34.925, -47.625)
  point P8 (34.925, 38.1)
  point P9 (34.925, -47.625)
  dimension "d92" = 12.7
  dimension "d93" = 3.175
  dimension "d96" = 85.725
  dimension "d99" = 69.85
  dimension "d106" = 6.35
  dimension "d107" = 6.35
  dimension "d108" = 6.35
  dimension "d109" = 6.35
  dimension "d110" = 6.35
  dimension "d111" = 22.225
  dimension "d112" = 17.4625
  dimension "d113" = 6.35
  dimension "d114" = 3.175
  dimension "d115" = 6.35
  dimension "d116" = 3.175
  dimension "d117" = 6.35
  dimension "d118" = 3.175
  dimension "d119" = 6.35
  dimension "d120" = 3.175
  dimension "d121" = 6.35
  dimension "d122" = 6.3492
hole "Hole3" at (-34.925, -47.625, 0) at (34.925, -47.625, 0) at (-34.925, 38.1, 0) at (34.925, 38.1, 0) direction (0, 0, -1) diameter 3.175 end through all countersink diameter 6.35 countersink angle 82
sketch "Sketch3" plane through (-38.1, 50.8, 0) normal (0, 1, 0) x (1, 0, 0)
  line L0 (0, 0) -> (0, 6.35) projected
  line L1 (0, 0) -> (76.2, 0) projected
  line L2 (76.2, 0) -> (76.2, 6.35) projected
  point P0 (38.1, 0)
  point P1 (3.175, 3.175)
  point P2 (73.025, 3.175)
  dimension "d77" = 3.175
  dimension "d78" = 3.175
  dimension "d79" = 3.175
hole "Hole4" at (-34.925, 50.8, -3.175) at (34.925, 50.8, -3.175) direction (0, -1, 0) diameter 3.175 depth 9.525 tip angle 118
extrude "Extrusion4" cut sketch "Sketch2" against normal blind 25.4 contours L5 L18 A2 L17 | L16 A5 L24 L7 | L27 A1 L8 L7 | L6 L20 A3 L19 | L23 A4 L22 L29 A1 L30 | L6 L9 A1 L28
fillet "Fillet4" radius 3.175 26 edges at (-28.2599, 44.45, -3.175) (-9.897, 26.0871, -3.175) (28.2599, 44.45, -3.175) (9.897, 26.0871, -3.175) (14.3871, 21.597, -3.175) (-14.3871, 1.803, -3.175) (14.3871, 1.803, -3.175) (31.75, 38.9599, -3.175) (-14.3871, 21.597, -3.175) (-31.75, 38.9599, -3.175) (-31.75, -15.5599, -3.175) (31.75, -15.5599, -3.175) (9.897, -2.6871, -3.175) (-9.897, -2.6871, -3.175) (-27.2593, -20.0494, -3.175) (27.2599, -20.05, -3.175) (14.1094, -33.6281, -3.175) (-13.6325, -33.247, -3.175) (-31.75, -24.5401, -3.175) (-18.0398, -37.8186, -3.175) (-31.75, -48.1697, -3.175) (-20.4747, -59.445, -3.175) (20.4747, -59.445, -3.175) (31.75, -48.1697, -3.175) (31.75, -24.5401, -3.175) (18.396, -38.3285, -3.175)
equation "\"d108\" = d106"
equation "\"d109\" = d108"
equation "\"d110\" = d109"
properties part number "Lower box side plate"
